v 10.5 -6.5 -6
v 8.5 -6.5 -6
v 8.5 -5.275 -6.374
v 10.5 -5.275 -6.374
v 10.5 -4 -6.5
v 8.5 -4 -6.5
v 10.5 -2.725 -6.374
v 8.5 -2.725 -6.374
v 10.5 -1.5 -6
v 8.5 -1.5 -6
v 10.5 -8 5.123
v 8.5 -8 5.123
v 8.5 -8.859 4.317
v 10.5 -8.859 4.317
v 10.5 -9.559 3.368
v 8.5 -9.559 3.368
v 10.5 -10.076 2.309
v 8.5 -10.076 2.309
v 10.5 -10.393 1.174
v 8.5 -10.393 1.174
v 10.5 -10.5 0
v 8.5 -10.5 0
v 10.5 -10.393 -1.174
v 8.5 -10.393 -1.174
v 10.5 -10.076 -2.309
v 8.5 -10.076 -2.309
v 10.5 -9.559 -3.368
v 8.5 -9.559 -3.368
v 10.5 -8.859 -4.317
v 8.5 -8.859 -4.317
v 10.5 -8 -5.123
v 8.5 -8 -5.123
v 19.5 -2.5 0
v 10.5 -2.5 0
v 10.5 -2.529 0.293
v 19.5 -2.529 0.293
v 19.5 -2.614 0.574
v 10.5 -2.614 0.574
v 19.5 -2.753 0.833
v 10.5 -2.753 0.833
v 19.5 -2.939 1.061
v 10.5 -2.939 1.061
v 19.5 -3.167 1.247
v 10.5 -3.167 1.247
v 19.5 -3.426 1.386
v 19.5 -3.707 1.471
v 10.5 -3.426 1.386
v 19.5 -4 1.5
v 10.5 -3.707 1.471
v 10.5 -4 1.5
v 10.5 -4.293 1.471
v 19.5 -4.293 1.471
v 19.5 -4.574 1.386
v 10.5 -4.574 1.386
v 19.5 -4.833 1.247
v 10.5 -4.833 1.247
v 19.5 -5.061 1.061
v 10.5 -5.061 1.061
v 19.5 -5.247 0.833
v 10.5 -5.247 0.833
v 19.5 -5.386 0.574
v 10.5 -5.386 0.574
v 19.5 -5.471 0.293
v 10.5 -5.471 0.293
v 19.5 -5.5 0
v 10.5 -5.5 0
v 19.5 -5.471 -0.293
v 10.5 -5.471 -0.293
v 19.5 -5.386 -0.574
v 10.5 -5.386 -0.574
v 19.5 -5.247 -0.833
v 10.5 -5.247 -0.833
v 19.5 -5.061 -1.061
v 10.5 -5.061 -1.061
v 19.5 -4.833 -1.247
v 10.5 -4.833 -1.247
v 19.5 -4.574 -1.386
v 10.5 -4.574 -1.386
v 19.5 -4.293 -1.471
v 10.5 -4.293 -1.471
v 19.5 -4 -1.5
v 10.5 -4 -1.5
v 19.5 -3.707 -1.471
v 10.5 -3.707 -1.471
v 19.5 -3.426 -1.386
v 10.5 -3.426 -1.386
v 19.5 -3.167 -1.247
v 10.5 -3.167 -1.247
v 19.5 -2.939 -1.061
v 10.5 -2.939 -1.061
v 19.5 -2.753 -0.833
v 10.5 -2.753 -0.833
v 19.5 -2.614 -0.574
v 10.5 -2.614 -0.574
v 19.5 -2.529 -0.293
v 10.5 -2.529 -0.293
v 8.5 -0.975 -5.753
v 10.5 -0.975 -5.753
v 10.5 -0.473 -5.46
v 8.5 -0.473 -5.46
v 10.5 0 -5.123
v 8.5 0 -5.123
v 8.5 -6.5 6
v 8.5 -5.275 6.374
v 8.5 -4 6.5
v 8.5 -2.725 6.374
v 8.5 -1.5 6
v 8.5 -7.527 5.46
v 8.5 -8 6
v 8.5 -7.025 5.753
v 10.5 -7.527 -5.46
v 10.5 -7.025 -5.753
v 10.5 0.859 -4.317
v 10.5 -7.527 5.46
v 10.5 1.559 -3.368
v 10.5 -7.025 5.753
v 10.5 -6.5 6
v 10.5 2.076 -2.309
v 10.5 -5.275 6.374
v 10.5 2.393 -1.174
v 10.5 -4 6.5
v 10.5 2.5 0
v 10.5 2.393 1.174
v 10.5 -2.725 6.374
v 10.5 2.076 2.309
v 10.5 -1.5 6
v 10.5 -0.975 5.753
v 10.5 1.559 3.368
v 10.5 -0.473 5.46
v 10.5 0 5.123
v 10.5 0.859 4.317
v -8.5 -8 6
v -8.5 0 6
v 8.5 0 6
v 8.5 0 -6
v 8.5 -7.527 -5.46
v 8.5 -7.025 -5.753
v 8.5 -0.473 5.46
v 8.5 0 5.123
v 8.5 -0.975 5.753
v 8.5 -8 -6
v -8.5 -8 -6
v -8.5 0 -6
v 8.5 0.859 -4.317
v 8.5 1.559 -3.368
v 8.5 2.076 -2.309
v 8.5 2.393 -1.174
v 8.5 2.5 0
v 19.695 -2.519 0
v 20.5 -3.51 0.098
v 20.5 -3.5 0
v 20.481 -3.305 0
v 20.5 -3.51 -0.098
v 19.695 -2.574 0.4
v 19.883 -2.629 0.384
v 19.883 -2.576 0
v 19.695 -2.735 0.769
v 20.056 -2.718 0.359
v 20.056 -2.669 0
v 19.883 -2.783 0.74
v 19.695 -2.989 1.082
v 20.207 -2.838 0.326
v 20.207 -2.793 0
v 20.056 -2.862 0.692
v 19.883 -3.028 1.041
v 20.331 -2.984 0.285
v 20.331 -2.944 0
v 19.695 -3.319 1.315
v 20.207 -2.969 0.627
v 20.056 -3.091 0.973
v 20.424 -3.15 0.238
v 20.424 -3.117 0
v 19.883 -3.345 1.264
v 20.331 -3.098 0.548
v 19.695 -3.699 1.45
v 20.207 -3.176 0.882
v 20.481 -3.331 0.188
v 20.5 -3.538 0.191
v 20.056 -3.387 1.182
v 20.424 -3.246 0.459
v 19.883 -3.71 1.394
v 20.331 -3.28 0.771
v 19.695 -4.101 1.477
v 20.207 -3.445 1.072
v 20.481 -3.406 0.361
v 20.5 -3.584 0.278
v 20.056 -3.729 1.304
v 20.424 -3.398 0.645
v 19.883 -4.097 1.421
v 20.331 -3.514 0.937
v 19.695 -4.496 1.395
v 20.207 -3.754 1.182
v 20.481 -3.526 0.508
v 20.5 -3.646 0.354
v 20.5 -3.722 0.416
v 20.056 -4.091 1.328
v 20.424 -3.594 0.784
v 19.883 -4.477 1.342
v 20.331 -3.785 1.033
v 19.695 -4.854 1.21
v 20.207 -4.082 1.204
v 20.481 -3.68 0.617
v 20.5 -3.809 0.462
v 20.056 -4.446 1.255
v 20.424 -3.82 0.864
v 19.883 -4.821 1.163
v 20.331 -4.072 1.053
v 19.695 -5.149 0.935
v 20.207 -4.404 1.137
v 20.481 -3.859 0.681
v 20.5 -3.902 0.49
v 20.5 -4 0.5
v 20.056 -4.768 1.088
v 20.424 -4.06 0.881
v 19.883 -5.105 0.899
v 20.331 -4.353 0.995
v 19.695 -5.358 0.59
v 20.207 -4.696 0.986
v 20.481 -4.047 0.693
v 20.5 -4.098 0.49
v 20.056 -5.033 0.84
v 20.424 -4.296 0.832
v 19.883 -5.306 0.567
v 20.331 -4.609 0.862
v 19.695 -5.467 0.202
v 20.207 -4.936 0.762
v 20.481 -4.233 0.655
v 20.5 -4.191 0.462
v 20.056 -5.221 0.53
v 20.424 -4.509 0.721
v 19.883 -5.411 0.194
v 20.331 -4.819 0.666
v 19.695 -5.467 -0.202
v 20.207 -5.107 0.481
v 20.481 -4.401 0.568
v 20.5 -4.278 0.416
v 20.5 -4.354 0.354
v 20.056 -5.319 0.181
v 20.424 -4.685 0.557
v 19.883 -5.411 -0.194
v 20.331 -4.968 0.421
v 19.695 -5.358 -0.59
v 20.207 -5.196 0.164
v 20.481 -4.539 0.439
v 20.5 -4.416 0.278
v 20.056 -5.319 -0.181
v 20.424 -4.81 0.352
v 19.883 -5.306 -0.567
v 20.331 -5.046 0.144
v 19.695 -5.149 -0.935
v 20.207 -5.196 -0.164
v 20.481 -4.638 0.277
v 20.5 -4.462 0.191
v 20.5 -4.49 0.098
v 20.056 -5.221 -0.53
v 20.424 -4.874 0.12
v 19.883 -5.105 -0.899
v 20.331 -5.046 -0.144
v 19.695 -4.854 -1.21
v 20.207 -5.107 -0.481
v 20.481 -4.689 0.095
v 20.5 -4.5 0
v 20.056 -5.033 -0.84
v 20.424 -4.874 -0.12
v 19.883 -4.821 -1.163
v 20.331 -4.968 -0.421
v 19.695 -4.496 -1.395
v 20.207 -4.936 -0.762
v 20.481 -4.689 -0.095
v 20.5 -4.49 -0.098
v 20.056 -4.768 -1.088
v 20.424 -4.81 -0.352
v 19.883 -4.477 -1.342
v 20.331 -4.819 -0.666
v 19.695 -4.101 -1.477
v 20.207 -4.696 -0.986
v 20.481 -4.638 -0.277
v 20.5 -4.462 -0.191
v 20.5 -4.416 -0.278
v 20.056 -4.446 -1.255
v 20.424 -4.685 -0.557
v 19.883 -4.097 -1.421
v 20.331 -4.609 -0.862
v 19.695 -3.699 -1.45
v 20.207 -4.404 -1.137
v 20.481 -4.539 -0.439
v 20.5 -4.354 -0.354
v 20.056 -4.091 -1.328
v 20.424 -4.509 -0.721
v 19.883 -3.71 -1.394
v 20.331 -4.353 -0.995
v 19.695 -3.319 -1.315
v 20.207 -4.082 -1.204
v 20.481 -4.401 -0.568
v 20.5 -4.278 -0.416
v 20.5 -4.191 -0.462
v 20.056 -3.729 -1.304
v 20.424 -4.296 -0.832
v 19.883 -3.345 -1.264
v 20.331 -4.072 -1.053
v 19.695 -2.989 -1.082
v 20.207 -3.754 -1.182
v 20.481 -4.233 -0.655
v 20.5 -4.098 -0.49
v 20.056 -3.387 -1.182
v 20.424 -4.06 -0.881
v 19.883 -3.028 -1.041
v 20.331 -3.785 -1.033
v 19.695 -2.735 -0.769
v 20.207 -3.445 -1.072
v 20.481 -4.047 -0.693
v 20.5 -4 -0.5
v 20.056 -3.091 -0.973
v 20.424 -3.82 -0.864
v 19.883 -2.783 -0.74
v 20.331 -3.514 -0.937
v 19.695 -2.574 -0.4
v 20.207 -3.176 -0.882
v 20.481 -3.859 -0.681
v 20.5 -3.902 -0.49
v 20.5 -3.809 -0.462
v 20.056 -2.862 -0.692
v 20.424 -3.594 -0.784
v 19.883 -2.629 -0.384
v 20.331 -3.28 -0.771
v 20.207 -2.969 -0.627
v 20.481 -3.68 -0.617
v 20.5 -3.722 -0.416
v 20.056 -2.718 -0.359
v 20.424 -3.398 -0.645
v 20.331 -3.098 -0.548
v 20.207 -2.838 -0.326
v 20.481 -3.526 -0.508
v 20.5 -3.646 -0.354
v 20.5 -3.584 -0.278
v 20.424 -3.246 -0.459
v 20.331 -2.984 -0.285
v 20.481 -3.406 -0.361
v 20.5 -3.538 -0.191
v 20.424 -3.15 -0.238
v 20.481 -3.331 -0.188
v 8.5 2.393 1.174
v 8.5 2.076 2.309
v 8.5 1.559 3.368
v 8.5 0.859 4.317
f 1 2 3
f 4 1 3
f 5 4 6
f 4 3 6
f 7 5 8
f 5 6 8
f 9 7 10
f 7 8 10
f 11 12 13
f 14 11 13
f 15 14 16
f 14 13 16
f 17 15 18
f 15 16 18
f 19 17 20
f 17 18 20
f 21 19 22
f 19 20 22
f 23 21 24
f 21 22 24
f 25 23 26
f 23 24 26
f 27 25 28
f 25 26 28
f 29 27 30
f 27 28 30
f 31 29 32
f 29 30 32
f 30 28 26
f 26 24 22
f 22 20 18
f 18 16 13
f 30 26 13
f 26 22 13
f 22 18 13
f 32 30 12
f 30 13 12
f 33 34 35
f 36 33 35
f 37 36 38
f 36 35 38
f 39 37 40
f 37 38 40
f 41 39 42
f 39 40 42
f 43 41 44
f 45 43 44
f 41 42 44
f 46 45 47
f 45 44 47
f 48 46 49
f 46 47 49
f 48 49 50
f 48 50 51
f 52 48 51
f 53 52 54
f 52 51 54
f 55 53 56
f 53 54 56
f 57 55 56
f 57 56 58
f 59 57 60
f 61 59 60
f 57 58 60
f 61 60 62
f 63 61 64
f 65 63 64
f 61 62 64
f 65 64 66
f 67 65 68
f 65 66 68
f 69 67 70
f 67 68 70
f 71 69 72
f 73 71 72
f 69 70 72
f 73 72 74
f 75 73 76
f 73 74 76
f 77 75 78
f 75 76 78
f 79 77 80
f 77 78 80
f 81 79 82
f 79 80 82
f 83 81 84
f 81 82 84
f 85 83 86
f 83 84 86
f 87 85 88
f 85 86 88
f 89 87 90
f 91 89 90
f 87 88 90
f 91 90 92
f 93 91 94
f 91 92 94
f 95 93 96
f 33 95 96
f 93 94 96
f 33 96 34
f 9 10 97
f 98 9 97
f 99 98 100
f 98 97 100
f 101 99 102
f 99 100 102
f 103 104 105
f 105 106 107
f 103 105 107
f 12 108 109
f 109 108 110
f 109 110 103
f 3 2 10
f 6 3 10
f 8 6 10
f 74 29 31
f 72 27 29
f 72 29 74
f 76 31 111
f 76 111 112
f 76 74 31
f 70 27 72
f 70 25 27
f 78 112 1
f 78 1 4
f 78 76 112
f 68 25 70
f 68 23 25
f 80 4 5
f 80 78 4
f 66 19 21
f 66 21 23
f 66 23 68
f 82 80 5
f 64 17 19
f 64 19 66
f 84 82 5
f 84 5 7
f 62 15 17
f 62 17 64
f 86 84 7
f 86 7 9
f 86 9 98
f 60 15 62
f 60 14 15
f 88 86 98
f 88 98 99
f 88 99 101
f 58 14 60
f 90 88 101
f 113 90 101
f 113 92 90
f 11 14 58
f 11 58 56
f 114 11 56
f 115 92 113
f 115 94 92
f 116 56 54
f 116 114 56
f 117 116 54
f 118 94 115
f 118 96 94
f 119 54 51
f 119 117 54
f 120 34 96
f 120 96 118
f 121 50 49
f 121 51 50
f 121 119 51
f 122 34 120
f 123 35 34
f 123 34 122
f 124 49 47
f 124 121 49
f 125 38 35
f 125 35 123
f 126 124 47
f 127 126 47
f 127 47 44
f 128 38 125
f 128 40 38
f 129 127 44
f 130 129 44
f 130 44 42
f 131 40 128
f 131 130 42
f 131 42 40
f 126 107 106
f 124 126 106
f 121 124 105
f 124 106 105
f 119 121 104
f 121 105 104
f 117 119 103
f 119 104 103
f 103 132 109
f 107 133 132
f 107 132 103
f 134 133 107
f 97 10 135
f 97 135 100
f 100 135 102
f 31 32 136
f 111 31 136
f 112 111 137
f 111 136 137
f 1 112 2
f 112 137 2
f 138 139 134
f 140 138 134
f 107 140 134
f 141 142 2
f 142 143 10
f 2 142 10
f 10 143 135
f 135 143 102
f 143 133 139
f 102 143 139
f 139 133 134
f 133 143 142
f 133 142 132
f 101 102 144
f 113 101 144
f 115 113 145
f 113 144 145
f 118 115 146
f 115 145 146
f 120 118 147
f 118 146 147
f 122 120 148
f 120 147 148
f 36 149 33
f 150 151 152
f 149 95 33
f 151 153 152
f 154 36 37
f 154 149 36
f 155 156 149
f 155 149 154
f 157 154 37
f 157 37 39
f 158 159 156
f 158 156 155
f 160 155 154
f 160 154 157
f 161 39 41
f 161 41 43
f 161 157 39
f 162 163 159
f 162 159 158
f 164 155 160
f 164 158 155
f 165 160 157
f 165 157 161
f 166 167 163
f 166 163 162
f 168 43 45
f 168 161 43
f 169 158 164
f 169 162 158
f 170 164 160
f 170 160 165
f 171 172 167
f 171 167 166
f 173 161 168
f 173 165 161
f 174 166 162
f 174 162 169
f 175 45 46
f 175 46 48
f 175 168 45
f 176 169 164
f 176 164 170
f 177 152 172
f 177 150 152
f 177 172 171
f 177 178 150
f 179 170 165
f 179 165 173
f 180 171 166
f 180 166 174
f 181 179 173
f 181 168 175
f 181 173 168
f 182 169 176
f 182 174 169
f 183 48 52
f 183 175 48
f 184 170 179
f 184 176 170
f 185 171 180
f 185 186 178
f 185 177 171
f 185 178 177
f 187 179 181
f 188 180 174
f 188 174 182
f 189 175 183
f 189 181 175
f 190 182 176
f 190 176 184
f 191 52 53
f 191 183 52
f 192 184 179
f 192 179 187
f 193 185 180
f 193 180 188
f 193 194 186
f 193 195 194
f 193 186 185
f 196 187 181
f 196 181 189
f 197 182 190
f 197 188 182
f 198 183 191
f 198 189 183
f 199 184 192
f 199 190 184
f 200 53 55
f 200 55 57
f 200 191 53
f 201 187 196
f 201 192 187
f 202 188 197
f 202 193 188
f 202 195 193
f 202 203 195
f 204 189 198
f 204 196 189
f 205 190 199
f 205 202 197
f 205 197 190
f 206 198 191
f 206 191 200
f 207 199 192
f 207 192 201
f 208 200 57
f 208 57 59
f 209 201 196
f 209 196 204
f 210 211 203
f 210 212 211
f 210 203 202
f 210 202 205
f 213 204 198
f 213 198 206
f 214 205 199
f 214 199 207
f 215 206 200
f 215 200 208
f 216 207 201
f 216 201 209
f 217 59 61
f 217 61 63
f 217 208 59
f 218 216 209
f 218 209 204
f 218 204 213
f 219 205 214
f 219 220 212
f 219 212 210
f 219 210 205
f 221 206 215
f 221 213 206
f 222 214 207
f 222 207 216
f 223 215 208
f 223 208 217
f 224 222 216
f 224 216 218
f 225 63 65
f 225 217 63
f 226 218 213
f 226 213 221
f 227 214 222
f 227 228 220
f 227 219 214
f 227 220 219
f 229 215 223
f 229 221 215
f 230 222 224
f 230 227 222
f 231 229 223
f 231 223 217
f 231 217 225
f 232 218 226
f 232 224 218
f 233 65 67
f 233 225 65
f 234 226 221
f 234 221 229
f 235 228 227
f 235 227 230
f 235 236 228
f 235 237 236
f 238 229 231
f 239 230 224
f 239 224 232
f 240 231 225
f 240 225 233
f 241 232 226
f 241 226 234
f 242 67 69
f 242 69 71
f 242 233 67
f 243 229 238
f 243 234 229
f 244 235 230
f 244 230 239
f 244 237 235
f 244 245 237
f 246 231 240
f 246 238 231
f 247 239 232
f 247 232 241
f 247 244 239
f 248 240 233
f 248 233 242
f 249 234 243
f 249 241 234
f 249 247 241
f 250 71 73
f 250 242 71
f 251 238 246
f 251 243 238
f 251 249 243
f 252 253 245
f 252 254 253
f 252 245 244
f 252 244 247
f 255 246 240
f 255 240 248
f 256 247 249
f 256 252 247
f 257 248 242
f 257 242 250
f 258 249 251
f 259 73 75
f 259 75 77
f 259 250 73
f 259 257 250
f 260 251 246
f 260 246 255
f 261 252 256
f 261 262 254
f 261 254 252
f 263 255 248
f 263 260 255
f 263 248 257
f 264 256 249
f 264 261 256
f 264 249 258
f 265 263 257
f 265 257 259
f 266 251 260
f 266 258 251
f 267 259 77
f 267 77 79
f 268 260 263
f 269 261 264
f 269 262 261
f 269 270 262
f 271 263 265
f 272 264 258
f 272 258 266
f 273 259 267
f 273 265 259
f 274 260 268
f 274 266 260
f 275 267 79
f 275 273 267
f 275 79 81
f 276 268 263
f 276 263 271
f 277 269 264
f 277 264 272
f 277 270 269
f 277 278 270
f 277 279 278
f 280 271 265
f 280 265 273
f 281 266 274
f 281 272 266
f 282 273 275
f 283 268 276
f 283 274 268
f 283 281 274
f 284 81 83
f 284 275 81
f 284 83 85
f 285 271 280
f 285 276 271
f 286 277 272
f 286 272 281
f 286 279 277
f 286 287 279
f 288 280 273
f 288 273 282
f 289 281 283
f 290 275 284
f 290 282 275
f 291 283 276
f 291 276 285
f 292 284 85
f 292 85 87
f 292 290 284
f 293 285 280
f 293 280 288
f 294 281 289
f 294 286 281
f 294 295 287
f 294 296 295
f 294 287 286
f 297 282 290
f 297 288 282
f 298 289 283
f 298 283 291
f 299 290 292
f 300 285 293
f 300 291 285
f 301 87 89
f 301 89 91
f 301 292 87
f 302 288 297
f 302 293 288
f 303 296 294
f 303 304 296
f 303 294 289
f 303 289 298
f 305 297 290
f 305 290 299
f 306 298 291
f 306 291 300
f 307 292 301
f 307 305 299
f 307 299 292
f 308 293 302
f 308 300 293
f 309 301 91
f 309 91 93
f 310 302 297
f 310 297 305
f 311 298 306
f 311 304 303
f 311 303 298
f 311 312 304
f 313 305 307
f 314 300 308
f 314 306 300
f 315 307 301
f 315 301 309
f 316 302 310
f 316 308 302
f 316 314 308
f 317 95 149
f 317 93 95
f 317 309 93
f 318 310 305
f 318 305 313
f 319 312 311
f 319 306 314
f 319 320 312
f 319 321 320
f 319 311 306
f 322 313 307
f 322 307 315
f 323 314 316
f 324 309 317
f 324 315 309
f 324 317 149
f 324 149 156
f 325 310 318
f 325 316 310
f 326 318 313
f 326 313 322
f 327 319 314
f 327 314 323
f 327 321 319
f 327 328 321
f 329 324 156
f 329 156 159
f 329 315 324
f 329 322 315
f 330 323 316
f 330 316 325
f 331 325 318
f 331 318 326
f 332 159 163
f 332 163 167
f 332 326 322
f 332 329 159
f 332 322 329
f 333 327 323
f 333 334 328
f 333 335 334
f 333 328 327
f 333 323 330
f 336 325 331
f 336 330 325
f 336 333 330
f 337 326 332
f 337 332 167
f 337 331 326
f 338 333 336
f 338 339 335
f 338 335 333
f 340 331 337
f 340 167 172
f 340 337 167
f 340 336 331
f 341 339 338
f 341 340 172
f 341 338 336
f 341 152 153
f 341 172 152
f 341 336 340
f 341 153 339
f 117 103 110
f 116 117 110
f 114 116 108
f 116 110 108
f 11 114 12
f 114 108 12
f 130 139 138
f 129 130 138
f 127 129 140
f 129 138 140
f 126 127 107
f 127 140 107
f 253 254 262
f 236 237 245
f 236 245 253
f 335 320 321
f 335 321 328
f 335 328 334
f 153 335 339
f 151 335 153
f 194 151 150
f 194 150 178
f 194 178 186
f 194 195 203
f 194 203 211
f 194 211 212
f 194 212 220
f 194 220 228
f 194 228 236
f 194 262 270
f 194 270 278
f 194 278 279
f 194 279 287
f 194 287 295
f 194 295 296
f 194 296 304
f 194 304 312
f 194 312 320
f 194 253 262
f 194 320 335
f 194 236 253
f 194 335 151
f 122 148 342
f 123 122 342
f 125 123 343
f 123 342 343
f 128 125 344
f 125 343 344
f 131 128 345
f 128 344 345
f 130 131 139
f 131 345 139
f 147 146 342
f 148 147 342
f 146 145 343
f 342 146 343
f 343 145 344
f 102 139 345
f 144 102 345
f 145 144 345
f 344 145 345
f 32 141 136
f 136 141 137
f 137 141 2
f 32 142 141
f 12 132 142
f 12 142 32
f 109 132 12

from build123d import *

# Parameters (mm, degrees)
F0_W     = 17
F0_H     = 12
F1_DEPTH = 8
F3_DEPTH = 2
F4_R     = 1.5
F5_DEPTH = 10
F6_R     = 1


with BuildPart() as f1:
    # F0 (on Front) → F1 (new body)
    with BuildSketch(Plane.XZ):
        Rectangle(F0_W, F0_H)
    extrude(amount=F1_DEPTH)

    # F2 (on face) → F3 (join)
    with BuildSketch(Plane.YZ.offset(8.5)):
        with BuildLine():
            Line((0, -5.123475383), (0, 5.123475383))
            ThreePointArc((0, 5.123475383), (-0.7205833063, 5.6120785943), (-1.5, 6))
            Line((-1.5, 6), (-6.5, 6))
            ThreePointArc((-6.5, 6), (-7.2794166937, 5.6120785943), (-8, 5.123475383))
            Line((-8, 5.123475383), (-8, -5.123475383))
            ThreePointArc((-8, -5.123475383), (-7.2794166937, -5.6120785943), (-6.5, -6))
            Line((-6.5, -6), (-1.5, -6))
            ThreePointArc((-1.5, -6), (-0.7205833063, -5.6120785943), (0, -5.123475383))
        make_face()
        with BuildLine():
            ThreePointArc((0, -5.123475383), (1.8416607228, -2.8504385627), (2.5, 0))
            ThreePointArc((2.5, 0), (1.8416607228, 2.8504385627), (0, 5.123475383))
            Line((0, 5.123475383), (0, -5.123475383))
        make_face()
        with BuildLine():
            Line((-6.5, 6), (-1.5, 6))
            ThreePointArc((-1.5, 6), (-4, 6.5), (-6.5, 6))
        make_face()
        with BuildLine():
            Line((-8, -5.123475383), (-8, 5.123475383))
            ThreePointArc((-8, 5.123475383), (-10.5, 0), (-8, -5.123475383))
        make_face()
        with BuildLine():
            ThreePointArc((-6.5, -6), (-4, -6.5), (-1.5, -6))
            Line((-1.5, -6), (-6.5, -6))
        make_face()
    extrude(amount=F3_DEPTH)

    # F4 (on face) → F5 (join)
    with BuildSketch(Plane.YZ.offset(10.5)):
        with Locations((-4, 0)):
            Circle(F4_R)
    extrude(amount=F5_DEPTH)

    # F6
    f6_edges = [f1.edges().sort_by_distance(p)[0] for p in [
        (20.5, -5.5, 0),
    ]]
    fillet(f6_edges, radius=F6_R)


solid = f1.part
